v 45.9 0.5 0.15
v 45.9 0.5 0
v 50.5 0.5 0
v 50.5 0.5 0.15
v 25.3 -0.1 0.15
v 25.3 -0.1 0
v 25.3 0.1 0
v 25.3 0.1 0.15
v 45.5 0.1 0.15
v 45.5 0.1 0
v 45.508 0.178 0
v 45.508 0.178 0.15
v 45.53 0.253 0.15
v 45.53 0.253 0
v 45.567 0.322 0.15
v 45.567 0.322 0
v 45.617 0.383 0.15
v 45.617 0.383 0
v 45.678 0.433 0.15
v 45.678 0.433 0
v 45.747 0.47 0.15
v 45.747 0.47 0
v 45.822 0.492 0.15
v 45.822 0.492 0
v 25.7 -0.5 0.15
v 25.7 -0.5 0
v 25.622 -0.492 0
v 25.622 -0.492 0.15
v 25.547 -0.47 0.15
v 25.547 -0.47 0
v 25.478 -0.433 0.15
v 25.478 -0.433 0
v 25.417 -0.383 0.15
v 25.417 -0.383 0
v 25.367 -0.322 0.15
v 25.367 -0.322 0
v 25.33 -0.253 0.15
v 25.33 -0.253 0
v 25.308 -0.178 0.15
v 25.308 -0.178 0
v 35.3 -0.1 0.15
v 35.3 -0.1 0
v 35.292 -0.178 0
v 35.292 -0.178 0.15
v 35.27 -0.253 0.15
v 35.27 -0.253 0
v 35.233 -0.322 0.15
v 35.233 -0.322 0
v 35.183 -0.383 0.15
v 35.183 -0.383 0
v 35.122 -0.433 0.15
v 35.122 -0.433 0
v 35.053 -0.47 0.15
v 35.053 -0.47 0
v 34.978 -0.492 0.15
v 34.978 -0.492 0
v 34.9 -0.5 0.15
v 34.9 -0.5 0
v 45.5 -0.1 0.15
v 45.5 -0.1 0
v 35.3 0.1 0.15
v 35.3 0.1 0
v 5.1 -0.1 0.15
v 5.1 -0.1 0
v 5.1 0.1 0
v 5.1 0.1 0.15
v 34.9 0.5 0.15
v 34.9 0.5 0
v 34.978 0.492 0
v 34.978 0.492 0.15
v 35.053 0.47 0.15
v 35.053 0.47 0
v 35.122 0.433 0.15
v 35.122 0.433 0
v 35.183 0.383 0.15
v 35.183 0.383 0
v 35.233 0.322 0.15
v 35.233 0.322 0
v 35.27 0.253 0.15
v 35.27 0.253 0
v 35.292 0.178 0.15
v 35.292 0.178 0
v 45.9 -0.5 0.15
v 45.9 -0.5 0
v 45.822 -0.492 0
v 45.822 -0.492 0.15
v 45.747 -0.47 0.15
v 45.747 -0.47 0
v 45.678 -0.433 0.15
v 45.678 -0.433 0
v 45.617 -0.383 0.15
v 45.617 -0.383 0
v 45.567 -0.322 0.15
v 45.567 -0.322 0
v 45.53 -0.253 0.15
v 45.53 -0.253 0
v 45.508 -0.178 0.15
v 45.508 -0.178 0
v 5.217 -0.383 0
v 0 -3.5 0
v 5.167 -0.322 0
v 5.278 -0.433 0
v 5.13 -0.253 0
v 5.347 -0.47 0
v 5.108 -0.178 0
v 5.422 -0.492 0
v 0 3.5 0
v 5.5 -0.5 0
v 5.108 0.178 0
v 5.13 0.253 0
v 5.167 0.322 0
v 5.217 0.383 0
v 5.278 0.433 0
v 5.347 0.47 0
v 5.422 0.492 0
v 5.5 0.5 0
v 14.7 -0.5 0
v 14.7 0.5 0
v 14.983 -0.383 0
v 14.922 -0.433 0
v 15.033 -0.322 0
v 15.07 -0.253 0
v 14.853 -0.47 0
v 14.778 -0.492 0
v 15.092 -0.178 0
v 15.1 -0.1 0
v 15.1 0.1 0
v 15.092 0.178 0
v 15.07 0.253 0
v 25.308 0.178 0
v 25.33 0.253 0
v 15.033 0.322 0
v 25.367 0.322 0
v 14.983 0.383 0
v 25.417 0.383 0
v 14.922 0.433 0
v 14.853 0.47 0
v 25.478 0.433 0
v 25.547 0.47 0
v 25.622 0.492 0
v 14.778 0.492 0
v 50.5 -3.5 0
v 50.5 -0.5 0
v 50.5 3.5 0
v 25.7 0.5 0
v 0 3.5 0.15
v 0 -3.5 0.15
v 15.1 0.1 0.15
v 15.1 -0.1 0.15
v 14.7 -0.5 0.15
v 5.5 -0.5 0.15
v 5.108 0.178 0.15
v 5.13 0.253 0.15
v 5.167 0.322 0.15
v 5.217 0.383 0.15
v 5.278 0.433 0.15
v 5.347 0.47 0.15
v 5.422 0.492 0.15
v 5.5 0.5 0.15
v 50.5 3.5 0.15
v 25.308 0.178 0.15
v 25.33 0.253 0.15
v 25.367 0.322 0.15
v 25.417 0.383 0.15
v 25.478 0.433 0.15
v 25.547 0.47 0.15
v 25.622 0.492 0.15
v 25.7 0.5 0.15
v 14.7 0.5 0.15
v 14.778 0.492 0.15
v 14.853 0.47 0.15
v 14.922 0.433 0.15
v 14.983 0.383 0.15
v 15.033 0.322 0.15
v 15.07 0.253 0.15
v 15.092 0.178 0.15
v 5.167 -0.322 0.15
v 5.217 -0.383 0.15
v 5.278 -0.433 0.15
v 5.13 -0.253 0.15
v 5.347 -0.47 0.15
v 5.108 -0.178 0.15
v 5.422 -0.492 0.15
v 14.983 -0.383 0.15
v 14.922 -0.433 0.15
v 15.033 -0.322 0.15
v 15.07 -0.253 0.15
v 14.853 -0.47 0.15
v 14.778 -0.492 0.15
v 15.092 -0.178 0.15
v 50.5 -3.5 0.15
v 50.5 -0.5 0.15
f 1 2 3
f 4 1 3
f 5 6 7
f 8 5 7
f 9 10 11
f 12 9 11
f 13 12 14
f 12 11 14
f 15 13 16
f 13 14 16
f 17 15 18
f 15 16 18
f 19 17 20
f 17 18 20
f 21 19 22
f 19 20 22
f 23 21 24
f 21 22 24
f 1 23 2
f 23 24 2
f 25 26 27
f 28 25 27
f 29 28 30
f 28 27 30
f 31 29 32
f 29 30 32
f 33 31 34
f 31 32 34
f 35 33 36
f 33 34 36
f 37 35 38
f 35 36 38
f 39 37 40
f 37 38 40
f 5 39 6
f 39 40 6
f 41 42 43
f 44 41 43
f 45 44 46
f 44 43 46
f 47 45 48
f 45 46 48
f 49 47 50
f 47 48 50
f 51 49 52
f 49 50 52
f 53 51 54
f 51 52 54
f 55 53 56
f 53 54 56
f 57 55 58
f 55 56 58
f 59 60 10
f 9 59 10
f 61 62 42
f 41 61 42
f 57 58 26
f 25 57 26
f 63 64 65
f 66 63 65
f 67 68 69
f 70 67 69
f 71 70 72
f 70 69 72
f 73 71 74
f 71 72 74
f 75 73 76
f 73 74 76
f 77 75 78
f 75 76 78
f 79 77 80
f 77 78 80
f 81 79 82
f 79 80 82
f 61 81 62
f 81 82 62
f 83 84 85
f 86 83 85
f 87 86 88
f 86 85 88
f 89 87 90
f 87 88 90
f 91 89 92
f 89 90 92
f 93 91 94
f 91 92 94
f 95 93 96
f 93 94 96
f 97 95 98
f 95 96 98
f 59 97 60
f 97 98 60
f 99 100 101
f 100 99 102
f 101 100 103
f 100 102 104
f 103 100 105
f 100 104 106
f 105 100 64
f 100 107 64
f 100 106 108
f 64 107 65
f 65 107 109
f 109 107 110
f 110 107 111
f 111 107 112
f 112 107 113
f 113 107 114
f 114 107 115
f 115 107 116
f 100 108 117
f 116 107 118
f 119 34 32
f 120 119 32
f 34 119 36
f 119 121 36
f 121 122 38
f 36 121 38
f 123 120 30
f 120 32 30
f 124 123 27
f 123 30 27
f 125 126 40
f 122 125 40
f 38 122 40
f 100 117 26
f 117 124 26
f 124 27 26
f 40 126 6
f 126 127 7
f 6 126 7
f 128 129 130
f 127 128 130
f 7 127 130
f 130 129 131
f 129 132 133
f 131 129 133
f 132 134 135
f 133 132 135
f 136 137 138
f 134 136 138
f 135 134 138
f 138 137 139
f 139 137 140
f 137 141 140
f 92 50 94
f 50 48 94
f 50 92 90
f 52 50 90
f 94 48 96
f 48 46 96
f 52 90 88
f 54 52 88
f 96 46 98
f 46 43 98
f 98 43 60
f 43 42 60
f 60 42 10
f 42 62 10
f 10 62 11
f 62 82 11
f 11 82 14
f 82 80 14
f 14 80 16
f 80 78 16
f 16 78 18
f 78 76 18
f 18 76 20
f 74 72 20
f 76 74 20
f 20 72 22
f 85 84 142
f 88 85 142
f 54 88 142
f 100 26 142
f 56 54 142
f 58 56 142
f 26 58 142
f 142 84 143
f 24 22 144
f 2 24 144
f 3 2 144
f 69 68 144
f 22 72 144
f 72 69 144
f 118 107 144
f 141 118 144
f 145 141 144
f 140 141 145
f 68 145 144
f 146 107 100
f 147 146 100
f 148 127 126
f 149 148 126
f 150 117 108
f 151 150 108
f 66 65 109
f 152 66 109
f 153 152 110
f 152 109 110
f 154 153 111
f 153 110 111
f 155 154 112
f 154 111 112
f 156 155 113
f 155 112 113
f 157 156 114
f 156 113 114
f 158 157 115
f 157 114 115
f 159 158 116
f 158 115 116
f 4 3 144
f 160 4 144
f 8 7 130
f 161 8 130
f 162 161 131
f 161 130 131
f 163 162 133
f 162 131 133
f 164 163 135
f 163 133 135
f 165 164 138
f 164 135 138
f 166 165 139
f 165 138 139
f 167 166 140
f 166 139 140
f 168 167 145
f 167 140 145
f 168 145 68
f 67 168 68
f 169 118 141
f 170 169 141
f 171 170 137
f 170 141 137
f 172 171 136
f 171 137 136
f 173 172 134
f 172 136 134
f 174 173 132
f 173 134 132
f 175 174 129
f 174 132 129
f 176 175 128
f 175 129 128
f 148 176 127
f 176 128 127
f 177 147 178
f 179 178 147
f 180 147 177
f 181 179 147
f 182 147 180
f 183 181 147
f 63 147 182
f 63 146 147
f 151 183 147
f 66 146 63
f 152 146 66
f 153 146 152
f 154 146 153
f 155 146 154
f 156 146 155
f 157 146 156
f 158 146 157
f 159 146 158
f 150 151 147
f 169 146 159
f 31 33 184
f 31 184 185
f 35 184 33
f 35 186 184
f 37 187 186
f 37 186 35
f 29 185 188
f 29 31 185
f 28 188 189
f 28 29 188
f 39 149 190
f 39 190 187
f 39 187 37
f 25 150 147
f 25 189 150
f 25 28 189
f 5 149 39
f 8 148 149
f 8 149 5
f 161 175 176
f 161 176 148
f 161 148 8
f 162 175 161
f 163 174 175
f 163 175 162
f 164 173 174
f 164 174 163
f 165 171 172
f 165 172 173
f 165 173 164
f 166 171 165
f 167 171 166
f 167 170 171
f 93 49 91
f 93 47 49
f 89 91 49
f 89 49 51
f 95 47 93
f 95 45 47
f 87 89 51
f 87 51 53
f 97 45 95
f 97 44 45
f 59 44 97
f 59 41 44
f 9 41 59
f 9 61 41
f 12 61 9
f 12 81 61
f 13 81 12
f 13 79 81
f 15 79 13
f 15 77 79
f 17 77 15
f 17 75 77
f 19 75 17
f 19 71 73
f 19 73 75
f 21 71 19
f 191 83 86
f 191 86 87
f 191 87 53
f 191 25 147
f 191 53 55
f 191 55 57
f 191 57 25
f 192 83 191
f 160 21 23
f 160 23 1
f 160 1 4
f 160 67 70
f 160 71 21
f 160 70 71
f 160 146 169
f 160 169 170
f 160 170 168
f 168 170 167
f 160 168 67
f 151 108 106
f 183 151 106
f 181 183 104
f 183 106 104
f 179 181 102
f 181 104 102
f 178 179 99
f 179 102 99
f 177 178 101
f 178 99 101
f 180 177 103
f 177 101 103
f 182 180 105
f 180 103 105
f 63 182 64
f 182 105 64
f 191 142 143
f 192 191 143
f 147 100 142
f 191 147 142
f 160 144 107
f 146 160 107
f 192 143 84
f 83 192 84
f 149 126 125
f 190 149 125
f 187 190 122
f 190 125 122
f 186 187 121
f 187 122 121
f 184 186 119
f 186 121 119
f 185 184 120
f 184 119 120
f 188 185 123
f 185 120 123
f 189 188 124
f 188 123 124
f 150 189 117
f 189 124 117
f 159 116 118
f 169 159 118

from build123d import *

# Parameters (mm, degrees)
F1_DEPTH = 0.15


# Not quite as in the source:
# - a feature names something its author has since deleted; it is built from what else it names


with BuildPart() as f1:
    # F0 (on Top) → F1 (new body)
    with BuildSketch(Plane.XY):
        with BuildLine():
            Line((10.1, -0.5), (10.1, -3.5))
            Line((10.1, -3.5), (20.2, -3.5))
            Line((20.2, -3.5), (30.3, -3.5))
            Line((30.3, -3.5), (30.3, -0.5))
            Line((30.3, -0.5), (25.7, -0.5))
            ThreePointArc((25.7, -0.5), (25.4171572875, -0.3828427125), (25.3, -0.1))
            Line((25.3, -0.1), (25.3, 0.1))
            ThreePointArc((25.3, 0.1), (25.4171572875, 0.3828427125), (25.7, 0.5))
            Line((25.7, 0.5), (30.3, 0.5))
            Line((30.3, 0.5), (30.3, 3.5))
            Line((30.3, 3.5), (20.2, 3.5))
            Line((20.2, 3.5), (10.1, 3.5))
            Line((10.1, 3.5), (10.1, 0.5))
            Line((10.1, 0.5), (14.7, 0.5))
            ThreePointArc((14.7, 0.5), (14.9828427125, 0.3828427125), (15.1, 0.1))
            Line((15.1, 0.1), (15.1, -0.1))
            ThreePointArc((15.1, -0.1), (14.9828427125, -0.3828427125), (14.7, -0.5))
            Line((14.7, -0.5), (10.1, -0.5))
        make_face()
        with BuildLine():
            Line((30.3, -0.5), (30.3, -3.5))
            Line((30.3, -3.5), (40.4, -3.5))
            Line((40.4, -3.5), (50.5, -3.5))
            Line((50.5, -3.5), (50.5, -0.5))
            Line((50.5, -0.5), (45.9, -0.5))
            ThreePointArc((45.9, -0.5), (45.6171572875, -0.3828427125), (45.5, -0.1))
            Line((45.5, -0.1), (45.5, 0.1))
            ThreePointArc((45.5, 0.1), (45.6171572875, 0.3828427125), (45.9, 0.5))
            Line((45.9, 0.5), (50.5, 0.5))
            Line((50.5, 0.5), (50.5, 3.5))
            Line((50.5, 3.5), (40.4, 3.5))
            Line((40.4, 3.5), (30.3, 3.5))
            Line((30.3, 3.5), (30.3, 0.5))
            Line((30.3, 0.5), (34.9, 0.5))
            ThreePointArc((34.9, 0.5), (35.1828427125, 0.3828427125), (35.3, 0.1))
            Line((35.3, 0.1), (35.3, -0.1))
            ThreePointArc((35.3, -0.1), (35.1828427125, -0.3828427125), (34.9, -0.5))
            Line((34.9, -0.5), (30.3, -0.5))
        make_face()
        with BuildLine():
            Line((0, 3.5), (0, -3.5))
            Line((0, -3.5), (10.1, -3.5))
            Line((10.1, -3.5), (10.1, -0.5))
            Line((10.1, -0.5), (5.5, -0.5))
            ThreePointArc((5.5, -0.5), (5.2171572875, -0.3828427125), (5.1, -0.1))
            Line((5.1, -0.1), (5.1, 0.1))
            ThreePointArc((5.1, 0.1), (5.2171572875, 0.3828427125), (5.5, 0.5))
            Line((5.5, 0.5), (10.1, 0.5))
            Line((10.1, 0.5), (10.1, 3.5))
            Line((10.1, 3.5), (0, 3.5))
        make_face()
    extrude(amount=F1_DEPTH)


solid = f1.part
